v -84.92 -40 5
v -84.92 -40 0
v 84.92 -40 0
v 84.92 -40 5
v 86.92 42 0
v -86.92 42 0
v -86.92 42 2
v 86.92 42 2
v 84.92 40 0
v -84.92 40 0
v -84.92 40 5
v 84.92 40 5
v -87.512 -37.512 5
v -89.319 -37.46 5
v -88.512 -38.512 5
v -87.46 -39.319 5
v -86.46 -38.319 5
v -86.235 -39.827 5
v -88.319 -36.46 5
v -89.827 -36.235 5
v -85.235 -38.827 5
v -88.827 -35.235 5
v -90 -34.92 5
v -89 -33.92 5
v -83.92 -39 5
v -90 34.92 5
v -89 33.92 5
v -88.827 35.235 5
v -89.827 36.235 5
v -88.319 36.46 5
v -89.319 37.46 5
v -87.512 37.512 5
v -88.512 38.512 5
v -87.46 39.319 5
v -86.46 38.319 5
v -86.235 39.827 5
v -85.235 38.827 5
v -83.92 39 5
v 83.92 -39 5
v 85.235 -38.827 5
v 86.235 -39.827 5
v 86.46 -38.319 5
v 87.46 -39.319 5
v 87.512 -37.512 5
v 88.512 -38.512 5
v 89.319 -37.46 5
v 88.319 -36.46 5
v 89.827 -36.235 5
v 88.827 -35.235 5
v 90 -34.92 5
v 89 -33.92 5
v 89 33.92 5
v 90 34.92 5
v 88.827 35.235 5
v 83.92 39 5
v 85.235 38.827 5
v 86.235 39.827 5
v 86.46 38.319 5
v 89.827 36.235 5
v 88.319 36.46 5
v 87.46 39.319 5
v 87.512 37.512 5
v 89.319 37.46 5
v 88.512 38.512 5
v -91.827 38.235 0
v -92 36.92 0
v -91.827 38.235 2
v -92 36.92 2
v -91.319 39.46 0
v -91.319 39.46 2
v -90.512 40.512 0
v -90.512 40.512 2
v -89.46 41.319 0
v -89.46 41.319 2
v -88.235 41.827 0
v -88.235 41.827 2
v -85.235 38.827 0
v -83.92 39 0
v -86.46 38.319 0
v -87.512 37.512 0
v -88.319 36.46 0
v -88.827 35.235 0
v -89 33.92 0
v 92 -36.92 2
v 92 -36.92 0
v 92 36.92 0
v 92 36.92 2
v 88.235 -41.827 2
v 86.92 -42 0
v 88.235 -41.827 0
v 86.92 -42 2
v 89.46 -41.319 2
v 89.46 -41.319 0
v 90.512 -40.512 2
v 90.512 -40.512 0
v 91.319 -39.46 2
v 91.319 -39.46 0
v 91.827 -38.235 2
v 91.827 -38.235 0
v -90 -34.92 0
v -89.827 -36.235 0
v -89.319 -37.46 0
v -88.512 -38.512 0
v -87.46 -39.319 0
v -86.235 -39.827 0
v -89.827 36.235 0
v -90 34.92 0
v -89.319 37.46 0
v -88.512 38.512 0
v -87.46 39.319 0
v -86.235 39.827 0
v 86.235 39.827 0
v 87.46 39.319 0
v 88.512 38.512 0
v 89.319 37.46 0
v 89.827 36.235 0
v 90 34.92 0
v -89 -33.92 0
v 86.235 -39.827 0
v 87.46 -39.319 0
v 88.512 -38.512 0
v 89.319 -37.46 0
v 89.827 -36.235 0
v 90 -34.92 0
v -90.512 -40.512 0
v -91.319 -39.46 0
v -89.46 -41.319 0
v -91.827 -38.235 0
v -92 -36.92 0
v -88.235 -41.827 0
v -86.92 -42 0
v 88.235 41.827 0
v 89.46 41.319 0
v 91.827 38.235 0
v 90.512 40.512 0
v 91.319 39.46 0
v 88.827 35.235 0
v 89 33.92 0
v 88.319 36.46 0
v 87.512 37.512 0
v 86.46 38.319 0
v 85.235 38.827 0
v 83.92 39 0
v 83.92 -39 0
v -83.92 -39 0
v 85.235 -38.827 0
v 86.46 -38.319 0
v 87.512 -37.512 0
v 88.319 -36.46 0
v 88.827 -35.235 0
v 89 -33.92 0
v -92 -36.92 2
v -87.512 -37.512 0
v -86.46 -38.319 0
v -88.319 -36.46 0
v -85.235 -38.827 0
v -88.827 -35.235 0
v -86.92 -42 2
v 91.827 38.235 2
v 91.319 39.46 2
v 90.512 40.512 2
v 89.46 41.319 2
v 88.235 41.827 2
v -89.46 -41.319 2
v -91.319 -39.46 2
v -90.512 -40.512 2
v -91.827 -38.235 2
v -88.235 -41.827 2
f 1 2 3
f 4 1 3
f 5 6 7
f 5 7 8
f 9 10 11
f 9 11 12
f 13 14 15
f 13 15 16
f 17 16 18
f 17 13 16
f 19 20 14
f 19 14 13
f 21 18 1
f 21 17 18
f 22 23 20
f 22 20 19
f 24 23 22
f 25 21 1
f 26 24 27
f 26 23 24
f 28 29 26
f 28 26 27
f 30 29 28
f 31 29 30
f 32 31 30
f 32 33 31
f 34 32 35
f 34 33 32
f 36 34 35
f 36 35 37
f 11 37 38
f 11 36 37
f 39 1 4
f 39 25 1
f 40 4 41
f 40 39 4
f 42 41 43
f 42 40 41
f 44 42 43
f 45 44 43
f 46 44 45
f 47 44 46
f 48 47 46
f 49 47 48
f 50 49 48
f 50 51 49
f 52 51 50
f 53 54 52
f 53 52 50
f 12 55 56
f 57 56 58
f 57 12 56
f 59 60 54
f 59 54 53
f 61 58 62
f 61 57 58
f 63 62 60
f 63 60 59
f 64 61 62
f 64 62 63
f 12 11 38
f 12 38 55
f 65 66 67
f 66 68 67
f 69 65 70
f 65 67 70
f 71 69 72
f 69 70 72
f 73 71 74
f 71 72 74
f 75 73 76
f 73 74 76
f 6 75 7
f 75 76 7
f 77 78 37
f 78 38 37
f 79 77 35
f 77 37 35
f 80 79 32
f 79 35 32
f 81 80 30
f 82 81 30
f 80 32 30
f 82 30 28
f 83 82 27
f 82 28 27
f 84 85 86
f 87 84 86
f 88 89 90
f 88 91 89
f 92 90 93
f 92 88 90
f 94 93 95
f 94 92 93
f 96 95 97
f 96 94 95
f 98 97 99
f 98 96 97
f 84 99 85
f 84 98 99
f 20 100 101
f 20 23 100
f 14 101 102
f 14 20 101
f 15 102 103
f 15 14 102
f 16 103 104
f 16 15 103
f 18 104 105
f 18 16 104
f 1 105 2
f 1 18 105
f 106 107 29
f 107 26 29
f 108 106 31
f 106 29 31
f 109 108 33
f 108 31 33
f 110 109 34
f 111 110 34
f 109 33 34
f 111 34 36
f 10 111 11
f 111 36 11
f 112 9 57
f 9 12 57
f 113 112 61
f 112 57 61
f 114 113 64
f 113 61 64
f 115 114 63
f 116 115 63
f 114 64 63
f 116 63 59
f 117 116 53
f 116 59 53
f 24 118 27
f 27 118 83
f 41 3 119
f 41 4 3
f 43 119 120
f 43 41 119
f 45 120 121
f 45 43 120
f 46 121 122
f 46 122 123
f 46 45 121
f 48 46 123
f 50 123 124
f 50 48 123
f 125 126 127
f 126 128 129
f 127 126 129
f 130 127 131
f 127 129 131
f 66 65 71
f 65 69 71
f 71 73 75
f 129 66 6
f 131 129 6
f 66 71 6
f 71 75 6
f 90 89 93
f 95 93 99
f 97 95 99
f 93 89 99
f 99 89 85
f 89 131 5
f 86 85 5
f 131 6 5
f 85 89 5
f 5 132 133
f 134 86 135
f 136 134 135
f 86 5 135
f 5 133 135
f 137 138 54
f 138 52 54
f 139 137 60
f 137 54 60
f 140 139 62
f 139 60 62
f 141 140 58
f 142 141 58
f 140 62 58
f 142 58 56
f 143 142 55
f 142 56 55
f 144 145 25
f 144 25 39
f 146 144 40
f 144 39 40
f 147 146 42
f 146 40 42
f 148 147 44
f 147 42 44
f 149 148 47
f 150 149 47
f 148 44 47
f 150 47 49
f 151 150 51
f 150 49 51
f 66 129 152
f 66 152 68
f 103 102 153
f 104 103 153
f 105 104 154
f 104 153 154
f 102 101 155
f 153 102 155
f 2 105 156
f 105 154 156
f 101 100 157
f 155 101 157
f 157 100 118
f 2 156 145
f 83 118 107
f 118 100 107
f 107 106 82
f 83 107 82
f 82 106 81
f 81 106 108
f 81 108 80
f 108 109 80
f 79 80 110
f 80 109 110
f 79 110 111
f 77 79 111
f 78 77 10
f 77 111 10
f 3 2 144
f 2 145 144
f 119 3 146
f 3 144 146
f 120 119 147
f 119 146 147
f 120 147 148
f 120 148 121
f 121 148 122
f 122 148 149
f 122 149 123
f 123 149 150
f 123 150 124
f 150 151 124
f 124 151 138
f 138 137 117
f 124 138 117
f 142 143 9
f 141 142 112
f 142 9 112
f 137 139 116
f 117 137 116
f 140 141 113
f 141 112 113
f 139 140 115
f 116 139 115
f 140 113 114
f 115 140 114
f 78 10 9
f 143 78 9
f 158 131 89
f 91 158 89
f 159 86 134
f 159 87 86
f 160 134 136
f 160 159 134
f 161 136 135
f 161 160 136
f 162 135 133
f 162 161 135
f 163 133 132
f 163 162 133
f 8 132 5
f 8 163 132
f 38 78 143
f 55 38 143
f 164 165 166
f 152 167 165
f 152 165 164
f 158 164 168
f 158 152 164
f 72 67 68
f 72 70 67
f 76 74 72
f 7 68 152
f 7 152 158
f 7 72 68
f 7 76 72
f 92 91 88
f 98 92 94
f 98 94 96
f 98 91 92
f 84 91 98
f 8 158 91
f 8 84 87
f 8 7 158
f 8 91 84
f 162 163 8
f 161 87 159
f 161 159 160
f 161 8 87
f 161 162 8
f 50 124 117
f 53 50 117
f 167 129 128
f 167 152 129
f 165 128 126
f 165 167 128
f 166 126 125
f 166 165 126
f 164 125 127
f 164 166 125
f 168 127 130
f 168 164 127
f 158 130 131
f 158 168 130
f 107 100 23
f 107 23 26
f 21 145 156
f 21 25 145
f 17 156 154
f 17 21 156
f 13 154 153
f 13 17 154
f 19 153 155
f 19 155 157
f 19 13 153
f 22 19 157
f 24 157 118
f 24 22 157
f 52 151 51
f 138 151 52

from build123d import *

# Parameters (mm, degrees)
F0_W     = 184
F0_H     = 84
F0_W_2   = 180
F0_H_2   = 80
F0_W_3   = 178
F0_H_3   = 78
F1_DEPTH = 2
F2_DEPTH = 5
F3_R     = 5.08
F3_2_R   = 5.08


with BuildPart() as f1:
    # F0 (on Top) → F1 (new body)
    with BuildSketch(Plane.XY):
        Rectangle(F0_W, F0_H)
        Rectangle(F0_W_2, F0_H_2, mode=Mode.SUBTRACT)
        Rectangle(F0_W_2, F0_H_2)
        Rectangle(F0_W_3, F0_H_3, mode=Mode.SUBTRACT)
        Rectangle(F0_W_3, F0_H_3)
    extrude(amount=F1_DEPTH)

    # F3#2
    f3_2_edges = [f1.edges().sort_by_distance(p)[0] for p in [
        (-92, 42, 1),
        (-92, -42, 1),
        (92, 42, 1),
        (92, -42, 1),
    ]]
    fillet(f3_2_edges, radius=F3_2_R)


with BuildPart() as f2:
    # F0 (on Top) → F2 (new body)
    with BuildSketch(Plane.XY):
        Rectangle(F0_W_2, F0_H_2)
        Rectangle(F0_W_3, F0_H_3, mode=Mode.SUBTRACT)
    extrude(amount=F2_DEPTH)

    # F3
    f3_edges = [f2.edges().sort_by_distance(p)[0] for p in [
        (-89, 39, 2.5),
        (-90, 40, 2.5),
        (-90, -40, 2.5),
        (-89, -39, 2.5),
        (90, 40, 2.5),
        (89, 39, 2.5),
        (90, -40, 2.5),
        (89, -39, 2.5),
    ]]
    fillet(f3_edges, radius=F3_R)


solid = Compound([f1.part, f2.part])
